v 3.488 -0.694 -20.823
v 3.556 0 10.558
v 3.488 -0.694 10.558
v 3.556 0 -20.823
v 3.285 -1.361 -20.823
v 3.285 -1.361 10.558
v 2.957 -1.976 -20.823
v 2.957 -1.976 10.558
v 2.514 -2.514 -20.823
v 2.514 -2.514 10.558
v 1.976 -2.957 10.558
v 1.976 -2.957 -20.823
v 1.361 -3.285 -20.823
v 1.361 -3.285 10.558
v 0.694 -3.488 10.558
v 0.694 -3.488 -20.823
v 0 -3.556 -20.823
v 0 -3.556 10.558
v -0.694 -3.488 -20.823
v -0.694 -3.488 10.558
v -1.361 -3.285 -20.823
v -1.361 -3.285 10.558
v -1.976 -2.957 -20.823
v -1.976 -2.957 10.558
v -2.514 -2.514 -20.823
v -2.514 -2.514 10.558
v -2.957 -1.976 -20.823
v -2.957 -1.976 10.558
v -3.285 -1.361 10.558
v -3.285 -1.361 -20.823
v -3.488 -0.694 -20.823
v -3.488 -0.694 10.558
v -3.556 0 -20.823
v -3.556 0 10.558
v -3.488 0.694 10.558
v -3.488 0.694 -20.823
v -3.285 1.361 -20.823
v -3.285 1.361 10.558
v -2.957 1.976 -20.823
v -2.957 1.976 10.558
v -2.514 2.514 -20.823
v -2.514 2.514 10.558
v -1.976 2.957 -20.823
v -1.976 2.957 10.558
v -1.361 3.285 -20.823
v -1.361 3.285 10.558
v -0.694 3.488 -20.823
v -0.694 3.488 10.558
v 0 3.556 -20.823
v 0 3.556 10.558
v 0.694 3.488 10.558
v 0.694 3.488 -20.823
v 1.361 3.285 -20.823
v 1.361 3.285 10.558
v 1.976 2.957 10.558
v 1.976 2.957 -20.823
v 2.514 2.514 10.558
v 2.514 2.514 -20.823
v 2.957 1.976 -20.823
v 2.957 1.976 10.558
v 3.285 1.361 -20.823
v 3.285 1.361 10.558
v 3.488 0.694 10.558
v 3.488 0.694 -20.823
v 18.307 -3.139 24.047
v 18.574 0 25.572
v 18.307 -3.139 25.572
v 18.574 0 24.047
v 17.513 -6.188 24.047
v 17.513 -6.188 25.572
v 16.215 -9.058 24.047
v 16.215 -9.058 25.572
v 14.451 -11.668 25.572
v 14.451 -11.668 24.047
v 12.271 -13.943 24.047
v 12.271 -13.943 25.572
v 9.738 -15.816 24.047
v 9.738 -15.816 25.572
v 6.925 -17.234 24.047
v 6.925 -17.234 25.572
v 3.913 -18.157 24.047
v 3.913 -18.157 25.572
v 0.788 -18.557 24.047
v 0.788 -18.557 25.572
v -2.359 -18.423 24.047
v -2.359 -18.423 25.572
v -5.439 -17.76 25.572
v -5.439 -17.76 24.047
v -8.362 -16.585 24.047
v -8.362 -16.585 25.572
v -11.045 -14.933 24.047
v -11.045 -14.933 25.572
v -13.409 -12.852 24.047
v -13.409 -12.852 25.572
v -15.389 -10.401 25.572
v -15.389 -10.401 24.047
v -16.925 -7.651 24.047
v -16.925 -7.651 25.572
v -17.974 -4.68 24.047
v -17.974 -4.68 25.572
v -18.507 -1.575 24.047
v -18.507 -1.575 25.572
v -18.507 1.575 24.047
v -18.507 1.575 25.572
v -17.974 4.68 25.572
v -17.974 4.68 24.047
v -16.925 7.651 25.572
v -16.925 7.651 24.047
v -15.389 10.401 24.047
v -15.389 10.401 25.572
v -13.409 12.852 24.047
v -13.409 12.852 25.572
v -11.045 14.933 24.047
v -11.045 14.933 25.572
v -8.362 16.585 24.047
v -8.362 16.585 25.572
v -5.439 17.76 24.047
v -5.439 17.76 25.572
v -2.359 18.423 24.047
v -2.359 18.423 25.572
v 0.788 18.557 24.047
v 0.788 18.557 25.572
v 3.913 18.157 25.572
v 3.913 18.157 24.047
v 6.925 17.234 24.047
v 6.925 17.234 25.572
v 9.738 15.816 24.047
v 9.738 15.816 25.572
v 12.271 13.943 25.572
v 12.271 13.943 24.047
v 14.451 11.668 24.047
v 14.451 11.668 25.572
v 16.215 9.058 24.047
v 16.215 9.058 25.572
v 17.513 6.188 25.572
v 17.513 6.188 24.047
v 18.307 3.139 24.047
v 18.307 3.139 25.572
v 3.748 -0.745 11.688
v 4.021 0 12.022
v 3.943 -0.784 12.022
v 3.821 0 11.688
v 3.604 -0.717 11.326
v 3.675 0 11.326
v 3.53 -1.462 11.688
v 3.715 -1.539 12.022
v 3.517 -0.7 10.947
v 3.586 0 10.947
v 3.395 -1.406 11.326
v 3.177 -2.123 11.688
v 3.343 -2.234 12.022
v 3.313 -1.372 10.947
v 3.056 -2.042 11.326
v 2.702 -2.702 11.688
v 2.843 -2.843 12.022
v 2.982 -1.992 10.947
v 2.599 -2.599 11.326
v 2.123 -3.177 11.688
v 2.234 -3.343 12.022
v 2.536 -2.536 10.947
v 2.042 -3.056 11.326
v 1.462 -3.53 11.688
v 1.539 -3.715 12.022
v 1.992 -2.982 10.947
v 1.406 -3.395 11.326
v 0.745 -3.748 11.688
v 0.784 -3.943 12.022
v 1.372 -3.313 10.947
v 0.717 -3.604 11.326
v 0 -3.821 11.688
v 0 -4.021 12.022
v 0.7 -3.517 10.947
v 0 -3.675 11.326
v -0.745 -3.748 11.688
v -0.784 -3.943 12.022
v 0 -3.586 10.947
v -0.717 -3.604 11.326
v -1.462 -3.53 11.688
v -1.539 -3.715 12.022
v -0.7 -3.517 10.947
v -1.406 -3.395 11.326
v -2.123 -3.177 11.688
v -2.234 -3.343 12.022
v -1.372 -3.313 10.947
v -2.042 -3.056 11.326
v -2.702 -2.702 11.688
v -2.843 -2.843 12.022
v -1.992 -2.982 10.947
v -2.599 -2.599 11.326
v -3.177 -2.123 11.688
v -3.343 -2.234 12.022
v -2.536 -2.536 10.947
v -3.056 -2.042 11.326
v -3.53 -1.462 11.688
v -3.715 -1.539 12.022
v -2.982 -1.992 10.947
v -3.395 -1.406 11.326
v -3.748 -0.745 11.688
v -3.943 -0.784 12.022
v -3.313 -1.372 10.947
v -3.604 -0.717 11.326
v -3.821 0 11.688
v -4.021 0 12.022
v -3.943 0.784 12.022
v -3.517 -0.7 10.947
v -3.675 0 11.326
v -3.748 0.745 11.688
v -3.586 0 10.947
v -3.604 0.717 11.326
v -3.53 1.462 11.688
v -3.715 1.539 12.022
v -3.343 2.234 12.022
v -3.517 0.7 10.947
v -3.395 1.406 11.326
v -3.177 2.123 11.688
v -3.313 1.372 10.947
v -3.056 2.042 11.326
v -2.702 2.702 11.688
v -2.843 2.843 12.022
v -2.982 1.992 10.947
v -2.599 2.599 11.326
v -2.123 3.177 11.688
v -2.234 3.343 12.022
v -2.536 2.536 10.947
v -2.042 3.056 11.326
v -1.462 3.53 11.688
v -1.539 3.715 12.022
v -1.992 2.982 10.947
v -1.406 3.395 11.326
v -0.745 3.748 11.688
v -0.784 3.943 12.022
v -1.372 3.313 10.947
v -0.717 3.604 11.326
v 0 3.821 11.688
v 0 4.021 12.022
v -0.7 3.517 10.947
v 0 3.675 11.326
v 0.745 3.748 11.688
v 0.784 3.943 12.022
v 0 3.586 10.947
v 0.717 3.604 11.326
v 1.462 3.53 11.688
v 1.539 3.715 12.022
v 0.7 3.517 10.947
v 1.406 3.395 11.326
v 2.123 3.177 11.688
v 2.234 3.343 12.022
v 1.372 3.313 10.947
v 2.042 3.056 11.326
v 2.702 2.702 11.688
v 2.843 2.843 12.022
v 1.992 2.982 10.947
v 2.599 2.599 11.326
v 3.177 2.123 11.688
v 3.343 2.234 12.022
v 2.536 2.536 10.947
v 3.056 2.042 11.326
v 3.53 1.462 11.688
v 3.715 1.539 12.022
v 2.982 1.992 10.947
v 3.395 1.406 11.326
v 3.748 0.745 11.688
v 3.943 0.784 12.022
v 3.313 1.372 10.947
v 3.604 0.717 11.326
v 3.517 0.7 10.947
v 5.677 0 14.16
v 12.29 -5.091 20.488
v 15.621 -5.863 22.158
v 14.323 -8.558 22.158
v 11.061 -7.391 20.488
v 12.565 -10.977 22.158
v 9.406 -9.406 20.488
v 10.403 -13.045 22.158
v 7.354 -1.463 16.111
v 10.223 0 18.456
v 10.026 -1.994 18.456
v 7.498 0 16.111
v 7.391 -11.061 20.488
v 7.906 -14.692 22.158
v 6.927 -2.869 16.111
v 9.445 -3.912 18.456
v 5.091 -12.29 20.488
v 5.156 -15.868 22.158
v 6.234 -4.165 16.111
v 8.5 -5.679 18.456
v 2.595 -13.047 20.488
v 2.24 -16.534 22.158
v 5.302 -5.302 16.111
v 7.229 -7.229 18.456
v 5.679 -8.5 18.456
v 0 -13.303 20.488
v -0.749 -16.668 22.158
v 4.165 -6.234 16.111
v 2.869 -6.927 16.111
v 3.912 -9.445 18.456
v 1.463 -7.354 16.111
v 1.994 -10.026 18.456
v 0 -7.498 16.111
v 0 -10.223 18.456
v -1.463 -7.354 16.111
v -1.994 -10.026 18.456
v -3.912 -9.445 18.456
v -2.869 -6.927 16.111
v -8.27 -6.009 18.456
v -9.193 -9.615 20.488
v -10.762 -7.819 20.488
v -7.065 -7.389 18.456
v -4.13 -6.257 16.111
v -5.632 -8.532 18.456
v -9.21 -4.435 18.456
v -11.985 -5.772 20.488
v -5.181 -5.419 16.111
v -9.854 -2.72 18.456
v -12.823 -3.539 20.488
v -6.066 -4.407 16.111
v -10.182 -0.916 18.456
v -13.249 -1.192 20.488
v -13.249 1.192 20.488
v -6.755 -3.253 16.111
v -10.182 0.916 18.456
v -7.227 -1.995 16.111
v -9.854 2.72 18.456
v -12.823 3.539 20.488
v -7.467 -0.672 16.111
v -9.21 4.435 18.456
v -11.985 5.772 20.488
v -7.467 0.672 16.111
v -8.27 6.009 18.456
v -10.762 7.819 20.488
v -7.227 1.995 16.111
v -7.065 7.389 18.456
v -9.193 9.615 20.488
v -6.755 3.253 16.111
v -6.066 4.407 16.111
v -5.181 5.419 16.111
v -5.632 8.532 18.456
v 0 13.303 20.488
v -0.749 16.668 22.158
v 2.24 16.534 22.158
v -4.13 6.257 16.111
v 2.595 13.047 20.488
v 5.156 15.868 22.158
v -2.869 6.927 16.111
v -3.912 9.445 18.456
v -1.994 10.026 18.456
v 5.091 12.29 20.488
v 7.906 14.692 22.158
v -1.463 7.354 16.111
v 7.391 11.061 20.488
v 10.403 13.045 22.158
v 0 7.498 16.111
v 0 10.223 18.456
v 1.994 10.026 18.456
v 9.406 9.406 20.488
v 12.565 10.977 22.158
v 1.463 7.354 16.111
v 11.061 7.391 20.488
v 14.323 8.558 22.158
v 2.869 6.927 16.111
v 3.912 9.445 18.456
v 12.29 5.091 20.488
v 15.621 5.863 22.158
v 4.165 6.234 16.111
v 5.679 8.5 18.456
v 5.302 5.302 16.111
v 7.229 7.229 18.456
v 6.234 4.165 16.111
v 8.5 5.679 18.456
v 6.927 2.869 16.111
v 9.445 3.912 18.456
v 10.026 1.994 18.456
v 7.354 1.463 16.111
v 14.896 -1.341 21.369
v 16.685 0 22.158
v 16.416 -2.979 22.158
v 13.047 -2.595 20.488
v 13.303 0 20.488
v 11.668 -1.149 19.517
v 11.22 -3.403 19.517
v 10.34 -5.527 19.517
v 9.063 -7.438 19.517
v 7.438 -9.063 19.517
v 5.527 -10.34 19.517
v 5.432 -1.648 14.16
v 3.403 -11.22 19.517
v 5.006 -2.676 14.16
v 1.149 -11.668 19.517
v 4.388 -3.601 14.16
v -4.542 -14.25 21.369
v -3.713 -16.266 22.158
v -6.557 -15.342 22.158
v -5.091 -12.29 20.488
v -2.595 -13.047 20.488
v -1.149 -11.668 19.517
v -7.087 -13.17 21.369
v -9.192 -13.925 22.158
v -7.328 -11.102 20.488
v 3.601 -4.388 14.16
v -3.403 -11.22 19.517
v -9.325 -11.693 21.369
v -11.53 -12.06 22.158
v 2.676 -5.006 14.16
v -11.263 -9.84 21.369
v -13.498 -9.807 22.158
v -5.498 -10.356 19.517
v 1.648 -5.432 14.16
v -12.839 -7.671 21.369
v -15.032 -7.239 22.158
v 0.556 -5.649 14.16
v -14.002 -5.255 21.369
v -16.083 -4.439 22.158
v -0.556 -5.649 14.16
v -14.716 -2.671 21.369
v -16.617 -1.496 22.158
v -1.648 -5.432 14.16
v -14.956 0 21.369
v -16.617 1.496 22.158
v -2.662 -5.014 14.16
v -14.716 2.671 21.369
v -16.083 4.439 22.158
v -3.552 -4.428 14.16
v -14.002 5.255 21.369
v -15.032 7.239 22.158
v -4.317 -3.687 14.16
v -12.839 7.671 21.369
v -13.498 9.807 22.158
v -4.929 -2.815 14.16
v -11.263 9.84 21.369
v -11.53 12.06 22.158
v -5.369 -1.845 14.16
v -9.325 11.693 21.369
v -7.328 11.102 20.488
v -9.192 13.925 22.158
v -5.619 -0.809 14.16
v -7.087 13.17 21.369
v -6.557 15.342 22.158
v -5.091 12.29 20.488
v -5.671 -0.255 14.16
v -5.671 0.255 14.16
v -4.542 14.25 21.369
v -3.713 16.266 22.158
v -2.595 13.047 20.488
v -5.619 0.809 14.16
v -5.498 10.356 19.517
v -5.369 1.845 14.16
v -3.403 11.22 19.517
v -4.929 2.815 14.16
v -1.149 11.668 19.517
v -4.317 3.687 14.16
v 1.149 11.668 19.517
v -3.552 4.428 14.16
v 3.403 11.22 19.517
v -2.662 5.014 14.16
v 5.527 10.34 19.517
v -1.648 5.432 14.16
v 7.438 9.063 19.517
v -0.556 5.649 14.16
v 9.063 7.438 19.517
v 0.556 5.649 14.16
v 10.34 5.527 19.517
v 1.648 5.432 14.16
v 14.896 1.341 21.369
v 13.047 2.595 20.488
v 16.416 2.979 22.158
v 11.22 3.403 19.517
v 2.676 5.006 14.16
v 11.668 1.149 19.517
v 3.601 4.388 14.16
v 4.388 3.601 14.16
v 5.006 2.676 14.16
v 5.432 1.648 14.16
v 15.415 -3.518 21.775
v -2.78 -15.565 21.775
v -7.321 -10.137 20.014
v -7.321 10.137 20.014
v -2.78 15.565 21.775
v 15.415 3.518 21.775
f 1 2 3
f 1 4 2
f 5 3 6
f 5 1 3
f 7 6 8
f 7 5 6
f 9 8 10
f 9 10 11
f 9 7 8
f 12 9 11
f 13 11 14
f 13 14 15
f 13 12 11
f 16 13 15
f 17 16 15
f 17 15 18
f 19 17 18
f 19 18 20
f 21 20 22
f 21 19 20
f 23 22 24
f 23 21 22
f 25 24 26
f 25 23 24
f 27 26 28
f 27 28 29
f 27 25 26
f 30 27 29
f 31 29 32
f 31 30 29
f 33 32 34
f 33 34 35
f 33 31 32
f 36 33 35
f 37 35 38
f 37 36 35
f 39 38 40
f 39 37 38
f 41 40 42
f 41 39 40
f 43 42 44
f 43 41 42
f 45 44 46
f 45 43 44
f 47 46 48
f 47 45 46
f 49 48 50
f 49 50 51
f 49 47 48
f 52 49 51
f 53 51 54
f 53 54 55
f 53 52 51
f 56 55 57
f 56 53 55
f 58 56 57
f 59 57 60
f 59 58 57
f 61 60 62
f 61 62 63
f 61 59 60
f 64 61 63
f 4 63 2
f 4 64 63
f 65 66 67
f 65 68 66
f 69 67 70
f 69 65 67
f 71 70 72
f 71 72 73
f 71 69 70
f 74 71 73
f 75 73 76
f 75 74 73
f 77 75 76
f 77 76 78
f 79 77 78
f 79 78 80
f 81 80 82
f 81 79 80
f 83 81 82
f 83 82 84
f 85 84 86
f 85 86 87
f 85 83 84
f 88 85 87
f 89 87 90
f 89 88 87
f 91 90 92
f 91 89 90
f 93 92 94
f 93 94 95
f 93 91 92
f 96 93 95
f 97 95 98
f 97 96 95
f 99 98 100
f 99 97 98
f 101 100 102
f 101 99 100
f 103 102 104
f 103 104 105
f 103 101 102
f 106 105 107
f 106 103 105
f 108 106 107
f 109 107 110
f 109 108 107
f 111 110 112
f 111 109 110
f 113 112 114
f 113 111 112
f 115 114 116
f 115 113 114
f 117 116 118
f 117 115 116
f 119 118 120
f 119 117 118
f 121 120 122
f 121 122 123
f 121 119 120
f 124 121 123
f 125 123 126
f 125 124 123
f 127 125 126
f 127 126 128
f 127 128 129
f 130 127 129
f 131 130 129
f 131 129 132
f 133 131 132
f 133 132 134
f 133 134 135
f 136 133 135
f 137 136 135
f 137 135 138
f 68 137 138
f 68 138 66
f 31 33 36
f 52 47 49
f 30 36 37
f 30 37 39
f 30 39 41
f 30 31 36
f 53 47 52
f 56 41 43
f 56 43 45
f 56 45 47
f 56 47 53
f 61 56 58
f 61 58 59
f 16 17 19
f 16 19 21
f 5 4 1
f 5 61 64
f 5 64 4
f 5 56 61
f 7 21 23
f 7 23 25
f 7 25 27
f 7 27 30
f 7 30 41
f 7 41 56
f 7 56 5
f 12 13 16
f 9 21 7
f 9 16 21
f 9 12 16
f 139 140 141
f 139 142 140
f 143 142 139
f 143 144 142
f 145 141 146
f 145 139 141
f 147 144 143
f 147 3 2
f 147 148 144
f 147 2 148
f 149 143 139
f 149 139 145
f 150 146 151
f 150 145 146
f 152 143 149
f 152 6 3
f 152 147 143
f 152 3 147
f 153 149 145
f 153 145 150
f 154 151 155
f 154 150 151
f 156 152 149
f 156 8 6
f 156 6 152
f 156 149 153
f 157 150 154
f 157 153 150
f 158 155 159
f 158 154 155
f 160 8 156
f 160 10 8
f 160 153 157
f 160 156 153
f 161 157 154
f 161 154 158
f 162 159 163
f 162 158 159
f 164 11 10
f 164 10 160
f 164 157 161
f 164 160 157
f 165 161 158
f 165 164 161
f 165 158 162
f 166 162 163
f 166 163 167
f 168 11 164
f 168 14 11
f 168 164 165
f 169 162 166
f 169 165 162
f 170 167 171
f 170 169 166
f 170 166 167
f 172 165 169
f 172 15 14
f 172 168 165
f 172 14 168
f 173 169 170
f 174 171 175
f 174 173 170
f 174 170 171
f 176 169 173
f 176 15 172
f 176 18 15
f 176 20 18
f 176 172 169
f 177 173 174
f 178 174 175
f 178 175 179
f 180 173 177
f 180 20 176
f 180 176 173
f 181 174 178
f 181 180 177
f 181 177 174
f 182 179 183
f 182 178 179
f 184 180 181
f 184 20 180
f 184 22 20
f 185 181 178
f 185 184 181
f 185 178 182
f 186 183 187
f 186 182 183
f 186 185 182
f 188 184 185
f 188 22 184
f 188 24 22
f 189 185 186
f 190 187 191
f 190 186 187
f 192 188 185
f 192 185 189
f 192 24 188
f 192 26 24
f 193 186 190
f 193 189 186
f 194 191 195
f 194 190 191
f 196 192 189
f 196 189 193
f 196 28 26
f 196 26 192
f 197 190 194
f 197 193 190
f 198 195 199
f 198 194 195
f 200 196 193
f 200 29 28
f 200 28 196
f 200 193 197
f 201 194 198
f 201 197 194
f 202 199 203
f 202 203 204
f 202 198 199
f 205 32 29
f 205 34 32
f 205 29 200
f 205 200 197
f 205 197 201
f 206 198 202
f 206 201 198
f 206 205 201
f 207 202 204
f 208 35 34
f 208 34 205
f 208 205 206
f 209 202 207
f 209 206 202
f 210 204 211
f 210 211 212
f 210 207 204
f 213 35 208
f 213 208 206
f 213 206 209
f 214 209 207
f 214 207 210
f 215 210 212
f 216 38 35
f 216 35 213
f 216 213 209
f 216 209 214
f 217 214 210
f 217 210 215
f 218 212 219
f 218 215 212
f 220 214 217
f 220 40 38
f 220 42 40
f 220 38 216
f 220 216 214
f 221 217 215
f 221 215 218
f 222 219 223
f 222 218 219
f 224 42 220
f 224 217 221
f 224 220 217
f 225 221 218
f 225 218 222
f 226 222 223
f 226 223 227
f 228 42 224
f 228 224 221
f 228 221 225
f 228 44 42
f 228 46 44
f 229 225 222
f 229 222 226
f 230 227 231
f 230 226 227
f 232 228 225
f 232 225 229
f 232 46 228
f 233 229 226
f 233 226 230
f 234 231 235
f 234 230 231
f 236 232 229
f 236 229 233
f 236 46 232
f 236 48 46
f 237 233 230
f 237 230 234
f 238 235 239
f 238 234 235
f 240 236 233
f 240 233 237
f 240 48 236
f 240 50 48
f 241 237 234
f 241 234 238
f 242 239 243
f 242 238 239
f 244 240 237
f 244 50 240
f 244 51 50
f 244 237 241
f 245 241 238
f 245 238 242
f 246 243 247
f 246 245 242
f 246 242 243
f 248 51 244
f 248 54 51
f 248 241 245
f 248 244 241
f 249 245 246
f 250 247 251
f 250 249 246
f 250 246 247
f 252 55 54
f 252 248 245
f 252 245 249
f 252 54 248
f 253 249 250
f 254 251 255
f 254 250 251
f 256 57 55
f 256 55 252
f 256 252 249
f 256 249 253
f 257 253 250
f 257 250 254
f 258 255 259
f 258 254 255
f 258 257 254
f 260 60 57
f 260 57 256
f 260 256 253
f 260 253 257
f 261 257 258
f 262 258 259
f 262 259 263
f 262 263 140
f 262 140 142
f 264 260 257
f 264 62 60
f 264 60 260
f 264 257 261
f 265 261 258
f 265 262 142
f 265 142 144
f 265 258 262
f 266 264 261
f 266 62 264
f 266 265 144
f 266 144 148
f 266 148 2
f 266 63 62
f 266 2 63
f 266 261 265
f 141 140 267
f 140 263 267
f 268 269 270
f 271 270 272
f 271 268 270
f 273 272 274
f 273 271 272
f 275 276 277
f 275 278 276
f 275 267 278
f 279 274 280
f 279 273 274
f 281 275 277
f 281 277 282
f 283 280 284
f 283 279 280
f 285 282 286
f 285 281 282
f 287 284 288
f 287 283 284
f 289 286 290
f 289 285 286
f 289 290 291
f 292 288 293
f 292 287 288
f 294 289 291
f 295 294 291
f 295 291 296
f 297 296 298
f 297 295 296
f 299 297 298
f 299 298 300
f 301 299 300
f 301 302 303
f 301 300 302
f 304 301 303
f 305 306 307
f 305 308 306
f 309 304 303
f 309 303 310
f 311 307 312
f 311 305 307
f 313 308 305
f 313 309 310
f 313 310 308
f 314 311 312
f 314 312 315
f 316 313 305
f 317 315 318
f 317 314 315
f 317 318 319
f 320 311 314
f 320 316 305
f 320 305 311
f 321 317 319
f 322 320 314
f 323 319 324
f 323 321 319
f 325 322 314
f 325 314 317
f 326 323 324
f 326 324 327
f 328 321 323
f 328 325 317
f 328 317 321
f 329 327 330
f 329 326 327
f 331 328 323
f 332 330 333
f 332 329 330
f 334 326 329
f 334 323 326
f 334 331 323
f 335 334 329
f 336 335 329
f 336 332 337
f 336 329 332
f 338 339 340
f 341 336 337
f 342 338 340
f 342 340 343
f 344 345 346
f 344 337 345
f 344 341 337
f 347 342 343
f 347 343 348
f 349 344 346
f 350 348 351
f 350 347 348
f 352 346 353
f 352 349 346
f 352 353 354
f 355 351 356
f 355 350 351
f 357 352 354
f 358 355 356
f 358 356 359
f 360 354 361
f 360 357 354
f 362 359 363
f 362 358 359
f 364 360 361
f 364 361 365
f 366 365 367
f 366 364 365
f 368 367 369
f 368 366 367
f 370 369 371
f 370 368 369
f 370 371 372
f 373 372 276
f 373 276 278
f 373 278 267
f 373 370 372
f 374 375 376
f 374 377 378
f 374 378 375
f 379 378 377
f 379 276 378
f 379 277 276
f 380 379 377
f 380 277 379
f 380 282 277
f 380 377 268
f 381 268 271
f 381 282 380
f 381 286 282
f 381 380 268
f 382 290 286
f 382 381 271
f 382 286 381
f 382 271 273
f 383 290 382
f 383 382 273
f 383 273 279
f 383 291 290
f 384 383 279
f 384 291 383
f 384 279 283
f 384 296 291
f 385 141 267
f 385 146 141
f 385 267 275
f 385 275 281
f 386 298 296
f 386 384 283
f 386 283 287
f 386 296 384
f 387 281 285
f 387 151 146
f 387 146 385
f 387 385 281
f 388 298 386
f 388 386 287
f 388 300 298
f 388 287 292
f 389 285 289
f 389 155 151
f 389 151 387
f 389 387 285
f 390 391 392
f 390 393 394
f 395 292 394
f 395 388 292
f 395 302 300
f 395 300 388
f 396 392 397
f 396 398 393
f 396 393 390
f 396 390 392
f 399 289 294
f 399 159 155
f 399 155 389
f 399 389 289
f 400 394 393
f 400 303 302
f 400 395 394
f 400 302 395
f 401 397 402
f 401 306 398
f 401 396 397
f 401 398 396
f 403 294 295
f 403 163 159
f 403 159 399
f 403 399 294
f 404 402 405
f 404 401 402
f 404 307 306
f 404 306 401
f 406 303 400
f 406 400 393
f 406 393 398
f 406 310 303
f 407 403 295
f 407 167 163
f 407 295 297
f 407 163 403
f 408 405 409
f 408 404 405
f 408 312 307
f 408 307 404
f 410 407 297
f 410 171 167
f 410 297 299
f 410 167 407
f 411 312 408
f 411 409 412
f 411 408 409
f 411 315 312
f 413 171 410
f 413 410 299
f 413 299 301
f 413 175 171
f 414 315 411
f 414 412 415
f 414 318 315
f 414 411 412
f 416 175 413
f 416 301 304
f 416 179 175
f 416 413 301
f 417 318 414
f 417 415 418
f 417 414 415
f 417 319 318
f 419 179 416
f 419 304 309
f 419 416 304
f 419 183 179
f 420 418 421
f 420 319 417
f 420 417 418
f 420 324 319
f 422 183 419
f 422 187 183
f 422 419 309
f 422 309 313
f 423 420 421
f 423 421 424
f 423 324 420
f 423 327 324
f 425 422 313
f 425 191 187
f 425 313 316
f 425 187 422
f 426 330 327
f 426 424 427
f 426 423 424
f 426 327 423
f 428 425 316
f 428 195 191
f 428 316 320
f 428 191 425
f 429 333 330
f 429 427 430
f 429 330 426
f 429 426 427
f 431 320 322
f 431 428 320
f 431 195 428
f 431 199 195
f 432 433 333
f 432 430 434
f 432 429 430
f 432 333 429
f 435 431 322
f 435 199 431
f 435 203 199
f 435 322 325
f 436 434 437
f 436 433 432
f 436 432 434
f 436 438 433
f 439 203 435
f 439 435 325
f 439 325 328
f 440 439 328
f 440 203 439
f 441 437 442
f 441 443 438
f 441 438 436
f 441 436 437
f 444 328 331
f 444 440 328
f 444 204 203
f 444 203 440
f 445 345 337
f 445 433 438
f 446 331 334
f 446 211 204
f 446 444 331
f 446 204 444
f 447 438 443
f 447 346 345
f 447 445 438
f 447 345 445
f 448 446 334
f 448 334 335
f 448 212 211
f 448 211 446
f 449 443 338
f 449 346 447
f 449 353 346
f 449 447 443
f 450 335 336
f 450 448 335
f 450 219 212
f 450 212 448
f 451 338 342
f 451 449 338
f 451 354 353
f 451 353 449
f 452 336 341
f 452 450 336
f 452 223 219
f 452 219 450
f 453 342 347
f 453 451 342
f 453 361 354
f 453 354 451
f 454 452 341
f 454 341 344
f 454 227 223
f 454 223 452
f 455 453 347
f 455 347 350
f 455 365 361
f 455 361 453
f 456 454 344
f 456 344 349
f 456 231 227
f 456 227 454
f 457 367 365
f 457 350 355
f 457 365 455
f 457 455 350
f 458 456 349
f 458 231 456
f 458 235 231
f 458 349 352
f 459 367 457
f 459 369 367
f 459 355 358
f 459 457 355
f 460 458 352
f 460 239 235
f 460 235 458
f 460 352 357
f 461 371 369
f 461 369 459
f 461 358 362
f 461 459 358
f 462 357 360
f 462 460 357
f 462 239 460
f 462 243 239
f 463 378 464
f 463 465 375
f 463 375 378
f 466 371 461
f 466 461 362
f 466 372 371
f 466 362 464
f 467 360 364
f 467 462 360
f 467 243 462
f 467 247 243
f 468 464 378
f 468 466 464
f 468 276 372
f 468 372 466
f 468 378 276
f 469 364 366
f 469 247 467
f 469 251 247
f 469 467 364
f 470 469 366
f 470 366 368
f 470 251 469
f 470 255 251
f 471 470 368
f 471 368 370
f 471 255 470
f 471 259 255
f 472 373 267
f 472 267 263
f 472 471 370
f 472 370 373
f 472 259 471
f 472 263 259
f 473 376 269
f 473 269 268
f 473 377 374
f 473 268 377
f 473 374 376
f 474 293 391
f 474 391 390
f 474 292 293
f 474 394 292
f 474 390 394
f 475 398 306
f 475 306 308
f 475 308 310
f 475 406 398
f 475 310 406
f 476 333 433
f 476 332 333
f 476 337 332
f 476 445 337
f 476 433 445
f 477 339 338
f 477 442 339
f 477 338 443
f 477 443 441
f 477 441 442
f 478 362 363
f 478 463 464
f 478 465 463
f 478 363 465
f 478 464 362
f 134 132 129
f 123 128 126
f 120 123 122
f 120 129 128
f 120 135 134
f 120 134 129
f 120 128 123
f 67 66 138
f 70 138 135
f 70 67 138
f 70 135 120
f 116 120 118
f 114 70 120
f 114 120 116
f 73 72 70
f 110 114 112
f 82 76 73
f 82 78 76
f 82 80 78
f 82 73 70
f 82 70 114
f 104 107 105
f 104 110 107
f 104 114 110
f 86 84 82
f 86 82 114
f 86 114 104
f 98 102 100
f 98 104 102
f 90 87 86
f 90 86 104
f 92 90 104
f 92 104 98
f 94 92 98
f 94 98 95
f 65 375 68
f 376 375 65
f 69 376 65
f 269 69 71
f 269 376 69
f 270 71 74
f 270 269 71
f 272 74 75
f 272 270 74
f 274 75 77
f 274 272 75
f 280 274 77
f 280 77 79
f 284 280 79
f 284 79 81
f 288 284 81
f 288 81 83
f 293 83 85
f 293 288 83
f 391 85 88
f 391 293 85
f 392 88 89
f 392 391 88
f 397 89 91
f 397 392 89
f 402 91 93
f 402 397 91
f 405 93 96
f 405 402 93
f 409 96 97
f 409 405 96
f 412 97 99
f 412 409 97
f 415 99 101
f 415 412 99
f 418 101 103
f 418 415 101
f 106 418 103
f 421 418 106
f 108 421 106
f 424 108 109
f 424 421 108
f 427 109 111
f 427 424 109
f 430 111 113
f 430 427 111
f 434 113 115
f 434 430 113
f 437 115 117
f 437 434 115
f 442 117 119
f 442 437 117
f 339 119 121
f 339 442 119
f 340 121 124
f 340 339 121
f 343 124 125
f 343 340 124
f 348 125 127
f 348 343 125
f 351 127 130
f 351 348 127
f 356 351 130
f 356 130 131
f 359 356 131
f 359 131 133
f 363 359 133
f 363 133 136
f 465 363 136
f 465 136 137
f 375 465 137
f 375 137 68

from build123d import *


with BuildPart() as part:
    # Sketch1 → Revolve1 (revolve)
    with BuildSketch(Plane(origin=(0, 0, 0), x_dir=(1, 0, 0), z_dir=(0, 1, 0))):
        with BuildLine():
            Line((0, -25.572091464), (18.57375, -25.572091464))
            Line((18.57375, -25.572091464), (18.57375, -24.046641665))
            Line((18.57375, -24.046641665), (16.684625, -22.157516665))
            add(Edge.make_bspline(
                [(16.684625, -22.157516665), (11.468108673, -19.962544079), (7.225955877, -16.564924261), (4.020652898, -12.022441155)],
                knots=[0, 0, 0, 0, 0.953211626, 0.953211626, 0.953211626, 0.953211626], degree=3))
            ThreePointArc((4.020652898, -12.022441155), (3.674948406, -11.326203905), (3.556, -10.558018263))
            Line((3.556, -10.558018263), (3.556, 20.823171826))
            Line((3.556, 20.823171826), (0, 20.823171826))
            Line((0, 20.823171826), (0, -25.572091464))
        make_face()
    revolve(axis=Axis((0, 0, 25.572091464), (0, 0, -1)))


solid = part.part
